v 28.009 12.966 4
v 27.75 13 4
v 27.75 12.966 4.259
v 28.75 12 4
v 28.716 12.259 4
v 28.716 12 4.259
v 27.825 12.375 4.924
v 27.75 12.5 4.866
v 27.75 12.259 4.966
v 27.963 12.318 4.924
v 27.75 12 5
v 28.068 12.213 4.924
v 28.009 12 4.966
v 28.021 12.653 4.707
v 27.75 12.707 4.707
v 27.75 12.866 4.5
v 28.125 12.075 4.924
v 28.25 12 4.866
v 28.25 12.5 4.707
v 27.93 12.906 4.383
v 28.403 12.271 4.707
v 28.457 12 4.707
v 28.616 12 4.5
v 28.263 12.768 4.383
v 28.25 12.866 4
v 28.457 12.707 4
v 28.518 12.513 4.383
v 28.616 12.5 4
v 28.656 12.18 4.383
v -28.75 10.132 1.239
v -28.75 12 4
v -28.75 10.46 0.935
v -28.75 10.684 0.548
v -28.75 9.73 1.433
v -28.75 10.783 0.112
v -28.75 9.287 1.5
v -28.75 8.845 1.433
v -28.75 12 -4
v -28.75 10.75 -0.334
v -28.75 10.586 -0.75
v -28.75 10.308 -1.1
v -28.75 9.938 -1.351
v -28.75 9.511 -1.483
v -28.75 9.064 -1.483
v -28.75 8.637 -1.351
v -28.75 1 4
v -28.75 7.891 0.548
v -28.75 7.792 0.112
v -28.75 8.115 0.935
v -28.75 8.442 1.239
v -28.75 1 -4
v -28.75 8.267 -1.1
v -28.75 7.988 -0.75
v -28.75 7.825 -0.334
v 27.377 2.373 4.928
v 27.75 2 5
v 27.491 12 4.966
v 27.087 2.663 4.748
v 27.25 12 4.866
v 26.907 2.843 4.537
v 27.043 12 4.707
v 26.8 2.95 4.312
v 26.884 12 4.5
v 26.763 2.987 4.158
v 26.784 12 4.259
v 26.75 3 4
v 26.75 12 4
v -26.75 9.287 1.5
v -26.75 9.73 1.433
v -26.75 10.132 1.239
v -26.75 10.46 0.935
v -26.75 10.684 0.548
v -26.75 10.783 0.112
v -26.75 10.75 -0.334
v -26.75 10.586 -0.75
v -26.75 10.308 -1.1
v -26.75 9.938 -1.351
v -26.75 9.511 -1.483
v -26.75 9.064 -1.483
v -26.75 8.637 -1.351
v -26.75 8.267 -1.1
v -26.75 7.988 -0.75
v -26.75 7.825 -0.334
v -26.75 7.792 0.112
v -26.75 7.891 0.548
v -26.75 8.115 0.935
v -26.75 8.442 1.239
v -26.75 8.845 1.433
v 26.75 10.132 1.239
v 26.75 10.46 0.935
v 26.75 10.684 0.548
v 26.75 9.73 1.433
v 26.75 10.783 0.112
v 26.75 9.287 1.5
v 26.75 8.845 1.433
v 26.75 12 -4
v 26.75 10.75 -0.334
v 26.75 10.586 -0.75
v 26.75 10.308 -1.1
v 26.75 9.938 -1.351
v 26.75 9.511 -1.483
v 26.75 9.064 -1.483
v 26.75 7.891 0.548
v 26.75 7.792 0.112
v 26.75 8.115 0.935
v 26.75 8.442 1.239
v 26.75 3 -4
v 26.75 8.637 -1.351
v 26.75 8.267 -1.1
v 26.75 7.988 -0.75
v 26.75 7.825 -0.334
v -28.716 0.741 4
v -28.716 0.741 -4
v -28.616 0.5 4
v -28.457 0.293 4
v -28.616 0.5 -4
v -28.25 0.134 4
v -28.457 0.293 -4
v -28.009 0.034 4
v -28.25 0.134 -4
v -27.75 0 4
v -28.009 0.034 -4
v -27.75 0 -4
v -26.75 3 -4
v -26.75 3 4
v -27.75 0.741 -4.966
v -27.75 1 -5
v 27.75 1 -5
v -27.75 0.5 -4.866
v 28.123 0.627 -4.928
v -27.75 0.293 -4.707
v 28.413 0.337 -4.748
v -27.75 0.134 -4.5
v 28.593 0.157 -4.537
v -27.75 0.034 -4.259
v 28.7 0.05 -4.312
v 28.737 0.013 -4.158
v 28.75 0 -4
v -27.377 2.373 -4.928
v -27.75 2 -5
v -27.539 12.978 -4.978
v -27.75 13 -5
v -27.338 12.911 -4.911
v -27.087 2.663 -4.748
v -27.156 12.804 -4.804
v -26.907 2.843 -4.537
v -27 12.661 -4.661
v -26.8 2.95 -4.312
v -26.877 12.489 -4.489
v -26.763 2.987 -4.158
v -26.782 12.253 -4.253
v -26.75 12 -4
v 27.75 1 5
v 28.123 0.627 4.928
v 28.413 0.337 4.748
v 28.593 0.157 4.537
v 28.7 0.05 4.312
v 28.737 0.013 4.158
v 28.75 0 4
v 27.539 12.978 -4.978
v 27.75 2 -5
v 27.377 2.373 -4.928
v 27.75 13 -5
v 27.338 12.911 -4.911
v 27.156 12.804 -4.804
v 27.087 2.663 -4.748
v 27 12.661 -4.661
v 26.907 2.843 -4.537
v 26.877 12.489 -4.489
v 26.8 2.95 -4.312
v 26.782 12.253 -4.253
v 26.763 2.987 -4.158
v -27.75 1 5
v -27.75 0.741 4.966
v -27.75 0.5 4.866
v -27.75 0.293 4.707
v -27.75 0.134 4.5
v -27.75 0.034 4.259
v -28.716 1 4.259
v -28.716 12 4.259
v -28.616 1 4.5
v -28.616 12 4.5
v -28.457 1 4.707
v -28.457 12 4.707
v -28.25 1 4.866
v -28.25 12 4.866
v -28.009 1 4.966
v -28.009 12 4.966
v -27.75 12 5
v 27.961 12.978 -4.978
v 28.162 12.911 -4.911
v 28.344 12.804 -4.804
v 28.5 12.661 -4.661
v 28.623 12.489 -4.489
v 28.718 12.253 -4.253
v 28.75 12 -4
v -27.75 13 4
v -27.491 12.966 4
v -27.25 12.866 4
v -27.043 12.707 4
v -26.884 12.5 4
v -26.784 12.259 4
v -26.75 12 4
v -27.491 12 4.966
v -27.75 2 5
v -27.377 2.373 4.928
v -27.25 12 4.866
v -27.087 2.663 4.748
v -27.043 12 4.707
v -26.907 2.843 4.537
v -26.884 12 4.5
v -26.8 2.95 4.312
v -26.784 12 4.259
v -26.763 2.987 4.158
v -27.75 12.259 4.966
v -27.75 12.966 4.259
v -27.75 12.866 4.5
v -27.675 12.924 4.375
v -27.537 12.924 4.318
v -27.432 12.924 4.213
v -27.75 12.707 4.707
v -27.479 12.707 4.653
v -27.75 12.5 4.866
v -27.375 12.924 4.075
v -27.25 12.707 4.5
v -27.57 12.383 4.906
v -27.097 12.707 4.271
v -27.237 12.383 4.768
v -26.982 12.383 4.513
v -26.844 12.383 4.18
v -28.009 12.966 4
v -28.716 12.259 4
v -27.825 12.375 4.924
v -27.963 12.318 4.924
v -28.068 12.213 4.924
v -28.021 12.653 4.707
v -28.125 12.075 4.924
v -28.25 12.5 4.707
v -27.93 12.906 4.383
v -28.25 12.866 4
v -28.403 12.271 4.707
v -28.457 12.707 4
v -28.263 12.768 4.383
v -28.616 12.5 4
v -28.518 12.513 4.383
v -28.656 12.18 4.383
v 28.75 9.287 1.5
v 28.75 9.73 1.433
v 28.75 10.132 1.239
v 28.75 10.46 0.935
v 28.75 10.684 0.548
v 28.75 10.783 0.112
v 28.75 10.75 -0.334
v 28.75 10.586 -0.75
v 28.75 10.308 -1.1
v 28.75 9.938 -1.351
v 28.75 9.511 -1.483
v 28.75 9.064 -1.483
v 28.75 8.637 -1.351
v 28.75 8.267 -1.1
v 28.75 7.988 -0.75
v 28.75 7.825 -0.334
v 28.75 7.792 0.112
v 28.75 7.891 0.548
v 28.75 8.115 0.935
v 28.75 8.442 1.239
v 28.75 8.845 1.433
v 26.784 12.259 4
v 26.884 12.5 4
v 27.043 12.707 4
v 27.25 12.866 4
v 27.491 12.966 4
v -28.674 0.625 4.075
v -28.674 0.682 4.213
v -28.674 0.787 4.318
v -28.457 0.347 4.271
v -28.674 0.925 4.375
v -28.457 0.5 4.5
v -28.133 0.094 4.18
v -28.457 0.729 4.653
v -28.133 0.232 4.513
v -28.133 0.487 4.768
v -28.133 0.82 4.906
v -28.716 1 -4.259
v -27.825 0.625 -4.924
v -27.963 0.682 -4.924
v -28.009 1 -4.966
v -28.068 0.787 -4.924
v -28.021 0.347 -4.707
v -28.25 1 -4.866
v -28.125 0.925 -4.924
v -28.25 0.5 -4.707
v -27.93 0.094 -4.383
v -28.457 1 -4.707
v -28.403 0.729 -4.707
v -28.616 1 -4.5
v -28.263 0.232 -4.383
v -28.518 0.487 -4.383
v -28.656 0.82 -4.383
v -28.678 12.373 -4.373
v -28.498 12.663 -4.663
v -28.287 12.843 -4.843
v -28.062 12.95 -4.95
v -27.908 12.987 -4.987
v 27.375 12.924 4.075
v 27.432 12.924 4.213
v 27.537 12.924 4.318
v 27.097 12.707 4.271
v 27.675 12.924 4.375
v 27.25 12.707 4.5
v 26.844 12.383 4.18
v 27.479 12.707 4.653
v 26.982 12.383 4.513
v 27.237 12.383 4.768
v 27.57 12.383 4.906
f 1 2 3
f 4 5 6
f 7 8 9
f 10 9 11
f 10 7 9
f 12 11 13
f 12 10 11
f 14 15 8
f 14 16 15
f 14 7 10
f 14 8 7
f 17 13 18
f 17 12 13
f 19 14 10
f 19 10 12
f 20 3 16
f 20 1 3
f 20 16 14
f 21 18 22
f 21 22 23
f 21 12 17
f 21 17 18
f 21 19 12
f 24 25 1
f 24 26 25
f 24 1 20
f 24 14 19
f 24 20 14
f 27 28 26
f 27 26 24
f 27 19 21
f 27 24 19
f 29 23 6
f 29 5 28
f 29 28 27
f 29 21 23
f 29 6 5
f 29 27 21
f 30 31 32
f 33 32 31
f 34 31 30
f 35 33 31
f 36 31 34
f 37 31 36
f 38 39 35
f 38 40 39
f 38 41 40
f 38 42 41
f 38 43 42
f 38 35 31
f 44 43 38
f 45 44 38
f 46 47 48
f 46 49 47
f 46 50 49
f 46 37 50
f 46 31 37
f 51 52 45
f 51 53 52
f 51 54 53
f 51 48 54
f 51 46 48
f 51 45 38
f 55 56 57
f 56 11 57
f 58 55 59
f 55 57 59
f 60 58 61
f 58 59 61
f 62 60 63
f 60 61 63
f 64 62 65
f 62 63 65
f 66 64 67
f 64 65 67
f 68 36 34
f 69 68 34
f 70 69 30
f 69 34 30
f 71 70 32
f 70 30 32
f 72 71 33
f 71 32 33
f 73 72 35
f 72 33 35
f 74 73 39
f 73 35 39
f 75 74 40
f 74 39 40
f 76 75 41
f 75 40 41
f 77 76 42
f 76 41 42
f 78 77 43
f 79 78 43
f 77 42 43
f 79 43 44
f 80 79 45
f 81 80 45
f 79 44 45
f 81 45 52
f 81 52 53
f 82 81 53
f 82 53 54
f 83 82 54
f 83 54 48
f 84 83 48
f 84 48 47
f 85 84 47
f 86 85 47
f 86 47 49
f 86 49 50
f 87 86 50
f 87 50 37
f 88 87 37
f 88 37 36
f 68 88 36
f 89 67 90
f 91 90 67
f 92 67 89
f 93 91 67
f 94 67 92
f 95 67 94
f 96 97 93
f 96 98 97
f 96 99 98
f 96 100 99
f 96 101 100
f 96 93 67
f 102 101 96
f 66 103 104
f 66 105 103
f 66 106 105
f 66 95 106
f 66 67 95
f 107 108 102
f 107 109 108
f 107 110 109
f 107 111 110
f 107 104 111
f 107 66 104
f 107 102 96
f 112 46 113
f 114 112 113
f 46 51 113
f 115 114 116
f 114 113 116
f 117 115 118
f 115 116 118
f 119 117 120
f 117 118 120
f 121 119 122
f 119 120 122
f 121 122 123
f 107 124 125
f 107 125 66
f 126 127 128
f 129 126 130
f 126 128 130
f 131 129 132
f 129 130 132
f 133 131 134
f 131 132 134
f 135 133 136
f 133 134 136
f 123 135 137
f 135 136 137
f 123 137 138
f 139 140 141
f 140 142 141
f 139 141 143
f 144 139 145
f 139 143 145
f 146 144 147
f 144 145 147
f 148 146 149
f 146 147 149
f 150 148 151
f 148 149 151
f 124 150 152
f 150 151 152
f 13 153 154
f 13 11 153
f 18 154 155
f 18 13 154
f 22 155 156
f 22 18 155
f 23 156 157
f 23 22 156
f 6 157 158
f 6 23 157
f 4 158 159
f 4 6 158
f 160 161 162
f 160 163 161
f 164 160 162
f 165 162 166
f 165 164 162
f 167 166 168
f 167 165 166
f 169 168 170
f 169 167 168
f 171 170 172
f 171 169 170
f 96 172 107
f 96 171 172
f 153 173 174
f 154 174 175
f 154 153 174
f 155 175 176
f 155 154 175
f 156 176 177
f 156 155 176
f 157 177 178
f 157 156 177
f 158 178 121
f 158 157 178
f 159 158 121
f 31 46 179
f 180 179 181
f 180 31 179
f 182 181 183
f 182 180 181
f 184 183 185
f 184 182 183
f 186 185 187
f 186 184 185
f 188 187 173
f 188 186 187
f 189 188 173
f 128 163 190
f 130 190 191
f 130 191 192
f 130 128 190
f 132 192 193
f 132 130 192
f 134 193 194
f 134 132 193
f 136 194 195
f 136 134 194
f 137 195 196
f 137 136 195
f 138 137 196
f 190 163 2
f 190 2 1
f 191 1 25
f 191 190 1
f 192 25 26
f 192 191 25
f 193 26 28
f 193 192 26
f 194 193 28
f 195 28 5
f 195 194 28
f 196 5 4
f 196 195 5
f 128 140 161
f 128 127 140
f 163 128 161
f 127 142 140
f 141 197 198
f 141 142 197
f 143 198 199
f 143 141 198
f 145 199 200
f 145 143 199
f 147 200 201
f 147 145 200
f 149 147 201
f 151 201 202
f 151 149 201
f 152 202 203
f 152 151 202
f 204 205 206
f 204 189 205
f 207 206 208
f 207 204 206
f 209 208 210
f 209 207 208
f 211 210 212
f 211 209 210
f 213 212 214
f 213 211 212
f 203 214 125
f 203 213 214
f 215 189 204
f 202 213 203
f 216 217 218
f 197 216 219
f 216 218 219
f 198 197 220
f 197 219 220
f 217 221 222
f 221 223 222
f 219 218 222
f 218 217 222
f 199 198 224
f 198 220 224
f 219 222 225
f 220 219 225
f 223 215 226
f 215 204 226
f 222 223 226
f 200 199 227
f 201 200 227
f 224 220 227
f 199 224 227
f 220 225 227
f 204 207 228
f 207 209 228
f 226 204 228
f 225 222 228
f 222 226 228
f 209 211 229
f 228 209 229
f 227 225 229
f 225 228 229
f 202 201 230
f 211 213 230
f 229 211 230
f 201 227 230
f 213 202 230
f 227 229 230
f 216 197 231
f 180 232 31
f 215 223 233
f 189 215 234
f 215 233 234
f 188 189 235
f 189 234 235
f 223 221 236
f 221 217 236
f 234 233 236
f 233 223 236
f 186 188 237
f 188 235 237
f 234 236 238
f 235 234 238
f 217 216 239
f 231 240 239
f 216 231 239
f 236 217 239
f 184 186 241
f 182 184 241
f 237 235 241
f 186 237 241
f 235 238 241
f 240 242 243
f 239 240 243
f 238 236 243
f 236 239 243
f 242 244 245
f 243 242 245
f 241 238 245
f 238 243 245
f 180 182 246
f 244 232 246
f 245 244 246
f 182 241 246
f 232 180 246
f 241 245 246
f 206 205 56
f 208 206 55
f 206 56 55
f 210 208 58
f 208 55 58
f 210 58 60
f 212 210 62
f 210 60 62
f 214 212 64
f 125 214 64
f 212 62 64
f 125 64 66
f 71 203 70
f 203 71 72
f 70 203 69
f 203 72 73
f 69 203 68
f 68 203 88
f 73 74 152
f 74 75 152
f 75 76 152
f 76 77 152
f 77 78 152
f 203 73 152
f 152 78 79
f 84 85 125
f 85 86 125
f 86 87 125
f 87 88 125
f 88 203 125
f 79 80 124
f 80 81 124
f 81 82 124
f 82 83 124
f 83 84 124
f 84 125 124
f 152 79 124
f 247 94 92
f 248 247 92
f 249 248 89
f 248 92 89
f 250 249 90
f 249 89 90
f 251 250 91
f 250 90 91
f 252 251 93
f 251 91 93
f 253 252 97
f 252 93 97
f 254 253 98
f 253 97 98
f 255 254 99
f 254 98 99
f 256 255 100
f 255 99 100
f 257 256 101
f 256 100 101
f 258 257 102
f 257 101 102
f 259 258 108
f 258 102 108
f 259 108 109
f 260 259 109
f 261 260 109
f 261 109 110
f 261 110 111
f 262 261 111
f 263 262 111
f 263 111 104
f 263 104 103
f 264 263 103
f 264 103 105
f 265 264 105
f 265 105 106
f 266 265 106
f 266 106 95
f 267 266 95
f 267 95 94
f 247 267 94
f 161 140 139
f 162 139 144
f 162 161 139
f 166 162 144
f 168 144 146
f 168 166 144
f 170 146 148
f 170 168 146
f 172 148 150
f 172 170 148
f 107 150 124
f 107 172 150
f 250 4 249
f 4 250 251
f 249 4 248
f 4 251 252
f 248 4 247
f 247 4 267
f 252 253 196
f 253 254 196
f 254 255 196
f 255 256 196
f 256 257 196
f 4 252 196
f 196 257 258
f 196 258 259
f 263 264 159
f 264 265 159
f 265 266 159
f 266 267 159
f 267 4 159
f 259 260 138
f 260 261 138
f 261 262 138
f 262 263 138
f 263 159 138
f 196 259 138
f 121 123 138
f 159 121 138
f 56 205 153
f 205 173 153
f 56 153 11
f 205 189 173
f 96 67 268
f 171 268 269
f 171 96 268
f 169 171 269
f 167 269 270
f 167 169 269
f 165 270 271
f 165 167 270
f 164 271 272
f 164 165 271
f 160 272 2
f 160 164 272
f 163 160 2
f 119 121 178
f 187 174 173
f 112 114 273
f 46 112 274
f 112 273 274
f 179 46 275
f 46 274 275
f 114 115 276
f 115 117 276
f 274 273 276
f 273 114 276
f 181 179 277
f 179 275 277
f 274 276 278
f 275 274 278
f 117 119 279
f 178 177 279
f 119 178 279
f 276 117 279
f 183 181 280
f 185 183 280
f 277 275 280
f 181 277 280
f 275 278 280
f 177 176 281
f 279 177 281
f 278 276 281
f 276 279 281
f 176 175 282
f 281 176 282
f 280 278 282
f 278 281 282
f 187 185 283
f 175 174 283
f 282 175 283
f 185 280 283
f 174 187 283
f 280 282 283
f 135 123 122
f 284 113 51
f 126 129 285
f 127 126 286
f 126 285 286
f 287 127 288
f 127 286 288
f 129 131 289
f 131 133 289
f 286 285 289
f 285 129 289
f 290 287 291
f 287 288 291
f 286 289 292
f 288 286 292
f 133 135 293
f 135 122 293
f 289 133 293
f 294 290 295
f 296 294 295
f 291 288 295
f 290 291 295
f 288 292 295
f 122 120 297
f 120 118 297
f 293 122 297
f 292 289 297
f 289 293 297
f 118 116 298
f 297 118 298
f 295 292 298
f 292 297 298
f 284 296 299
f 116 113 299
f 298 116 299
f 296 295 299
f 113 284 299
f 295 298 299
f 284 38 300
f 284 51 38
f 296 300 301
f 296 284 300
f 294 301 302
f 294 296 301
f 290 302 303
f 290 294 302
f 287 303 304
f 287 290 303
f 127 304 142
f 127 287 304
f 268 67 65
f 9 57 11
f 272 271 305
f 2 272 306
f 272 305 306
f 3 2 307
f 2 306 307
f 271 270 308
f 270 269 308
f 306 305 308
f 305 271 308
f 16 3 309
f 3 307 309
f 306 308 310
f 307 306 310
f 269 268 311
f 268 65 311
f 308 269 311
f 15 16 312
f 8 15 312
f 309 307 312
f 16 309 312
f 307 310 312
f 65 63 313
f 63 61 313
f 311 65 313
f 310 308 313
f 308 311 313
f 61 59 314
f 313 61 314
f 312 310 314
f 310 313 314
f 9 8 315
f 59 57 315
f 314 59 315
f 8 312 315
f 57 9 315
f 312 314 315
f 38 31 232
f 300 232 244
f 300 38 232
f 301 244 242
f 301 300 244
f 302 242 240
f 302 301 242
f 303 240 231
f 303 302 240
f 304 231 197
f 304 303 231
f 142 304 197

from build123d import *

# Parameters (mm, degrees)
SKETCH1_W           = 57.5
SKETCH1_H           = 10
BOSS_EXTRUDE1_DEPTH = 3
SKETCH2_W           = 2
SKETCH2_H           = 10
BOSS_EXTRUDE2_DEPTH = 10
SKETCH3_R           = 1.5
CUT_EXTRUDE1_DEPTH  = 60.162910679
FILLET1_R           = 1


with BuildPart() as part:
    # Sketch1 → Boss-Extrude1 (new body)
    with BuildSketch(Plane(origin=(0, 0, 0), x_dir=(1, 0, 0), z_dir=(0, 1, 0))):
        Rectangle(SKETCH1_W, SKETCH1_H)
    extrude(amount=BOSS_EXTRUDE1_DEPTH)

    # Sketch2 → Boss-Extrude2 (add)
    with BuildSketch(Plane(origin=(0, 3, 0), x_dir=(1, 0, 0), z_dir=(0, 1, 0))):
        with Locations((-27.75, 0)):
            Rectangle(SKETCH2_W, SKETCH2_H)
        with Locations((27.75, 0)):
            Rectangle(SKETCH2_W, SKETCH2_H)
    extrude(amount=BOSS_EXTRUDE2_DEPTH)

    # Sketch3 → Cut-Extrude1 (cut, through all)
    with BuildSketch(Plane.ZY.offset(28.75)):
        with Locations((0, 9.287412426)):
            Circle(SKETCH3_R)
    extrude(amount=-CUT_EXTRUDE1_DEPTH, mode=Mode.SUBTRACT)

    # Fillet1
    fillet1_edges = [part.edges().sort_by_distance(p)[0] for p in [
        (0, 3, 5),
        (-26.75, 8, 5),
        (-26.75, 8, -5),
        (-28.75, 13, 0),
        (-27.75, 13, 5),
        (-26.75, 13, 0),
        (0, 3, -5),
        (26.75, 8, -5),
        (26.75, 8, 5),
        (28.75, 13, 0),
        (26.75, 13, 0),
        (27.75, 13, 5),
        (0, 0, 5),
        (-28.75, 0, 0),
        (0, 0, -5),
        (28.75, 6.5, 5),
        (-28.75, 6.5, 5),
        (-28.75, 6.5, -5),
        (28.75, 6.5, -5),
    ]]
    fillet(fillet1_edges, radius=FILLET1_R - 0.0001)  # a hair under: the kernel refuses the full size


solid = part.part
